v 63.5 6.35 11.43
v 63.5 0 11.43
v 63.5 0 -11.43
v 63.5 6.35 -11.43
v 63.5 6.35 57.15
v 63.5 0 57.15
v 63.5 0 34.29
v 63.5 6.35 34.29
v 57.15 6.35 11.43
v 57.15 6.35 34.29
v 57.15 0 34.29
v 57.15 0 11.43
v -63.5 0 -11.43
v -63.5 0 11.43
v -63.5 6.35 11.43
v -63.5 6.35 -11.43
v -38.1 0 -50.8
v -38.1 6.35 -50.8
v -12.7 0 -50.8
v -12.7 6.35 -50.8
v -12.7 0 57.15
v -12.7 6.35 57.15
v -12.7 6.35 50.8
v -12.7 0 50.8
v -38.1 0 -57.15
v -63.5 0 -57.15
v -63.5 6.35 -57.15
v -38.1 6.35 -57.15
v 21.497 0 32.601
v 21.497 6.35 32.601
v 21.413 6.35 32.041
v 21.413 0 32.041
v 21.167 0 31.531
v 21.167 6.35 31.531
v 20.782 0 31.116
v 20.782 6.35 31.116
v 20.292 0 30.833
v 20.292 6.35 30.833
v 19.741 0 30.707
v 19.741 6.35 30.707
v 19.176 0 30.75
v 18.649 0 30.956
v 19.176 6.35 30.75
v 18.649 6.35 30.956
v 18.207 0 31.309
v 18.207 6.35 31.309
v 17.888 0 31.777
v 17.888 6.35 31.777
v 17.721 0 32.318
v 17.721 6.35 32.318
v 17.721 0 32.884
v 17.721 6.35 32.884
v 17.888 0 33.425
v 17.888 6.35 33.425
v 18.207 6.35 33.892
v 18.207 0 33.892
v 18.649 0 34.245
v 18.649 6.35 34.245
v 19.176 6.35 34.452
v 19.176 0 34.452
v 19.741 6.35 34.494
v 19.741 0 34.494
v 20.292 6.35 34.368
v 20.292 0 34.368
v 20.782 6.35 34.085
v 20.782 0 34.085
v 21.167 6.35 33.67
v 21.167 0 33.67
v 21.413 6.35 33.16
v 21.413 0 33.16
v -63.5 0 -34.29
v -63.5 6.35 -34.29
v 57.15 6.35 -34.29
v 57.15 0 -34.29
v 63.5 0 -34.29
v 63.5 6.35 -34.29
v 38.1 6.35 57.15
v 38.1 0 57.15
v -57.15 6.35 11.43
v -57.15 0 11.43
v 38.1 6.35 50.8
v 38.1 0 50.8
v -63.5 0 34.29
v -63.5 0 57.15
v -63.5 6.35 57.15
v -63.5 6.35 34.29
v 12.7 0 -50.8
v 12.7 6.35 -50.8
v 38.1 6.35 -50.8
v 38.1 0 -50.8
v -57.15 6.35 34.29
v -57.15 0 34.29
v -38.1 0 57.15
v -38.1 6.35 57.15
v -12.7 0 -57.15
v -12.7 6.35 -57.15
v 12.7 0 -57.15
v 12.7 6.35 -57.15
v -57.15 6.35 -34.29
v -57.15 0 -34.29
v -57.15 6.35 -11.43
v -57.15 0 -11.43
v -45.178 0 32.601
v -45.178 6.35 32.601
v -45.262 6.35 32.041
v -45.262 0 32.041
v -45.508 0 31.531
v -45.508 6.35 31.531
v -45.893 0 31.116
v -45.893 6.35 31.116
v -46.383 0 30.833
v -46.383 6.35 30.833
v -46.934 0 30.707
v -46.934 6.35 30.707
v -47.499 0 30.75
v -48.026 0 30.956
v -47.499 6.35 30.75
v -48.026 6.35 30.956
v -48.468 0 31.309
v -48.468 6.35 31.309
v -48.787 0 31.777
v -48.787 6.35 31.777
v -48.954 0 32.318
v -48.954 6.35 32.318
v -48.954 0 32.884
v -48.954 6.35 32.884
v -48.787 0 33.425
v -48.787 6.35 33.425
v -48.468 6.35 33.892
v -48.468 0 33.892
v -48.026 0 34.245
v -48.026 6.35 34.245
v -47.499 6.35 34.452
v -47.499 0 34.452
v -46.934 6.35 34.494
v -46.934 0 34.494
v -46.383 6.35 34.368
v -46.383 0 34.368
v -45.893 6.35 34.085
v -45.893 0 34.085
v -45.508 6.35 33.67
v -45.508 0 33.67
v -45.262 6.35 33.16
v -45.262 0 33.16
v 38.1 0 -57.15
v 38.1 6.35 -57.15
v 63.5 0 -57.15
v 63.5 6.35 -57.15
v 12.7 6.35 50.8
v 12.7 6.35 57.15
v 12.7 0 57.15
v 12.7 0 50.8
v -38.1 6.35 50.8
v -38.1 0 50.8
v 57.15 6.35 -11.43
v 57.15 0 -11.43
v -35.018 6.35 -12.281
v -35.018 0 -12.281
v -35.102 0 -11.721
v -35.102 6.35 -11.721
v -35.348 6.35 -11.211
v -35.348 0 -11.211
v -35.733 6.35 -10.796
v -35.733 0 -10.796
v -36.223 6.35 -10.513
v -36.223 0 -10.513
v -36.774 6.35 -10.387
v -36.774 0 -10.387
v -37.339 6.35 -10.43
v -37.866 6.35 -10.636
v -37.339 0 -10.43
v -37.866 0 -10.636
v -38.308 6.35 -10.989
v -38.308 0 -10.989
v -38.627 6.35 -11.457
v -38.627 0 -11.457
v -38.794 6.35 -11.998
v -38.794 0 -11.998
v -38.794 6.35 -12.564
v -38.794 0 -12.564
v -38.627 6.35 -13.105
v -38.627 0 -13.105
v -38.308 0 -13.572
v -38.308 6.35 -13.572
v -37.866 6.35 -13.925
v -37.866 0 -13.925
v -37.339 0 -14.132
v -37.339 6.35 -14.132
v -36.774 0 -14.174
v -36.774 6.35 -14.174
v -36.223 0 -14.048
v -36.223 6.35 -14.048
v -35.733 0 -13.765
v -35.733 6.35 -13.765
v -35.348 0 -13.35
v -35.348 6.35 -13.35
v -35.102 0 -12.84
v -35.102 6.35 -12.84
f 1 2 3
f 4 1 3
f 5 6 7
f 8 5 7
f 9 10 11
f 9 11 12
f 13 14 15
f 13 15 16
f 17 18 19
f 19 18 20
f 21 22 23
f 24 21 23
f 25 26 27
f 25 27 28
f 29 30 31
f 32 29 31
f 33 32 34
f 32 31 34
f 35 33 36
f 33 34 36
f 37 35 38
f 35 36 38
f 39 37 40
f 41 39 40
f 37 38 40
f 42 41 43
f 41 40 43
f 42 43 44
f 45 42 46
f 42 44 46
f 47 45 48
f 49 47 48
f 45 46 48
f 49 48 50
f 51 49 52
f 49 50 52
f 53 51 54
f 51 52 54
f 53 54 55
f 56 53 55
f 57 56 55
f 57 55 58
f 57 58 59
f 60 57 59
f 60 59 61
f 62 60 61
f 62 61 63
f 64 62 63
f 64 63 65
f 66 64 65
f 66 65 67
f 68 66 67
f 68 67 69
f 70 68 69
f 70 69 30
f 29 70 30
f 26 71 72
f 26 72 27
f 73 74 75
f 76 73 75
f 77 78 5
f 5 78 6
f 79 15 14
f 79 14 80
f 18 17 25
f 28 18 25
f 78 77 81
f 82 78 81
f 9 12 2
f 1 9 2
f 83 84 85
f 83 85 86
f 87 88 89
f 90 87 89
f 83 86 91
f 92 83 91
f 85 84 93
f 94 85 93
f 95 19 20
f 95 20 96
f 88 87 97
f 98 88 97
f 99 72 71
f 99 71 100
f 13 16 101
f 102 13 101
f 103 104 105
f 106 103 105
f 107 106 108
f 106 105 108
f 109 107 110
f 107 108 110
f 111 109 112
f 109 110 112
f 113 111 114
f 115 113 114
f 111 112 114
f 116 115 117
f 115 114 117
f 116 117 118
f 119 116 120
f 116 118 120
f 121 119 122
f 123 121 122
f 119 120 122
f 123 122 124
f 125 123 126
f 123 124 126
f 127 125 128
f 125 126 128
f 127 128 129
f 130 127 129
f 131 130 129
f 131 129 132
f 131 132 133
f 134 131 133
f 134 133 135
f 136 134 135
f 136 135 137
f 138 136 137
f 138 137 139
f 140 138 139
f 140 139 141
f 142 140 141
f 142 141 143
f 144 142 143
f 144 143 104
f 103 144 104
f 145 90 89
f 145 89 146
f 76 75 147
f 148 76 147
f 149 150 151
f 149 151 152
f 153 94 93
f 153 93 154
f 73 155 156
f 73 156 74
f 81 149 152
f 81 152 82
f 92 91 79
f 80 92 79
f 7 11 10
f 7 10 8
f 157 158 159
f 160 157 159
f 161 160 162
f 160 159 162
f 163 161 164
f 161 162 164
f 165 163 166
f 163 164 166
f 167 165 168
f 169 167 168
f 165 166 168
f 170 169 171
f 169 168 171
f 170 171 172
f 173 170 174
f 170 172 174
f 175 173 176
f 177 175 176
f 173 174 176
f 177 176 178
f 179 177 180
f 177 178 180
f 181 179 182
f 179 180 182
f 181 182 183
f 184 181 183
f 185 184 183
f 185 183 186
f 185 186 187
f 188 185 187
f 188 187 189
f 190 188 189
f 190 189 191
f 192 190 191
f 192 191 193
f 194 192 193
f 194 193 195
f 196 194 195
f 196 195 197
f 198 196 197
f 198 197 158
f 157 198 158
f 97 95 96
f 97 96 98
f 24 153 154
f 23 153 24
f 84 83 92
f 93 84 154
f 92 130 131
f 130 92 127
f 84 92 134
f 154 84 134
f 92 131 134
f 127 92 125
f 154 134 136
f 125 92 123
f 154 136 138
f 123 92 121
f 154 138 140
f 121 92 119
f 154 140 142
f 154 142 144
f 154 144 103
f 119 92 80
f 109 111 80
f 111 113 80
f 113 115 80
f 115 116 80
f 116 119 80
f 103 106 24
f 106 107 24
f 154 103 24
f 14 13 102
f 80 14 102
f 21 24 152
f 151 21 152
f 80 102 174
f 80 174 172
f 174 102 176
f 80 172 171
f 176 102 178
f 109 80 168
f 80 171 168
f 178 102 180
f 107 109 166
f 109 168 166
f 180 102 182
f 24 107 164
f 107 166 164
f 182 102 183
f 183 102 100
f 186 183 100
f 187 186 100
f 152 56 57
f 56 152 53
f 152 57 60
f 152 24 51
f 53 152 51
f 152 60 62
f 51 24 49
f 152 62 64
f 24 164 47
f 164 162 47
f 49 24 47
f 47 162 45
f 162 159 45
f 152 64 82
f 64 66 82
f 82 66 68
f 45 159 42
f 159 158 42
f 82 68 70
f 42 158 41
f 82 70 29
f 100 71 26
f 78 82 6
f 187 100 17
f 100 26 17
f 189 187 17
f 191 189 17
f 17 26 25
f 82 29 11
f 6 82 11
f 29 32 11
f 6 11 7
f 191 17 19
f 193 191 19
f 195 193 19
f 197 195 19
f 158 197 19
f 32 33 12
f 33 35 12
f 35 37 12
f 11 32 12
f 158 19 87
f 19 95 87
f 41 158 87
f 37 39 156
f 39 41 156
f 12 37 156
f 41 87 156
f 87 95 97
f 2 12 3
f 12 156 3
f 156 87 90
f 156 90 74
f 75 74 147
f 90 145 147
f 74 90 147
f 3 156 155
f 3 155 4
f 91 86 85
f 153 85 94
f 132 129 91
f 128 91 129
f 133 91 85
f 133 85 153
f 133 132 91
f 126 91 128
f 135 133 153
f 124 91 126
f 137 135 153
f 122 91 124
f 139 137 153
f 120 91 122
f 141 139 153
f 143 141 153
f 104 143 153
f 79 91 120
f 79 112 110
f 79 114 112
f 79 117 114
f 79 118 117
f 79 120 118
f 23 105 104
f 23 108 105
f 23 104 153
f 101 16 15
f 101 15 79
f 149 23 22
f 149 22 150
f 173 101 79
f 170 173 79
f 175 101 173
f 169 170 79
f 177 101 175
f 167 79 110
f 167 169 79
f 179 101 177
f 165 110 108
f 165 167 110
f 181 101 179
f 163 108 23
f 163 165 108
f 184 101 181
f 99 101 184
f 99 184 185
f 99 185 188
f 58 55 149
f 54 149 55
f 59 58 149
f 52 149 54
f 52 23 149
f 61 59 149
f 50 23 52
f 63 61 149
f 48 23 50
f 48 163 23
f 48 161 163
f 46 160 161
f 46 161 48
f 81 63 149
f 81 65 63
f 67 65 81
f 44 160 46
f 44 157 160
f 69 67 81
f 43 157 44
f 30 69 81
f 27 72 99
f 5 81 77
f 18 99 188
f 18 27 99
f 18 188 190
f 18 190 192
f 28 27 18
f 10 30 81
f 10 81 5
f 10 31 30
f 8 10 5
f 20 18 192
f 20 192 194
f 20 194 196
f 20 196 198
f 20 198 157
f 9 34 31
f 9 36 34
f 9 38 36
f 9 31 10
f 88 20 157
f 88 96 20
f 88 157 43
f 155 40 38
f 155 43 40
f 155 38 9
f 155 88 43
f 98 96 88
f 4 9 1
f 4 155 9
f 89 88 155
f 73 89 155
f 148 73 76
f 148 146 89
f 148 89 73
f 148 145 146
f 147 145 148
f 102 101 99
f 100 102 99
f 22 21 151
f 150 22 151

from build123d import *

# Parameters (mm, degrees)
SKETCH1_W           = 127
SKETCH1_H           = 114.3
BOSS_EXTRUDE1_DEPTH = 6.35
SKETCH2_W           = 6.35
SKETCH2_H           = 22.86
SKETCH2_W_2         = 25.4
SKETCH2_H_2         = 6.35
CUT_EXTRUDE1_DEPTH  = 7.35
SKETCH3_R           = 1.89865
CUT_EXTRUDE2_DEPTH  = 7.35
SKETCH4_R           = 1.89865
CUT_EXTRUDE3_DEPTH  = 7.35


with BuildPart() as part:
    # Sketch1 → Boss-Extrude1 (new body)
    with BuildSketch(Plane(origin=(0, 0, 0), x_dir=(1, 0, 0), z_dir=(0, 1, 0))):
        Rectangle(SKETCH1_W, SKETCH1_H)
    extrude(amount=BOSS_EXTRUDE1_DEPTH)

    # Sketch2 → Cut-Extrude1 (cut, through all)
    with BuildSketch(Plane(origin=(0, 6.35, 0), x_dir=(1, 0, 0), z_dir=(0, 1, 0))):
        with Locations((-60.325, -22.86)):
            Rectangle(SKETCH2_W, SKETCH2_H)
        with Locations((-60.325, 22.86)):
            Rectangle(SKETCH2_W, SKETCH2_H)
        with Locations((-25.4, 53.975)):
            Rectangle(SKETCH2_W_2, SKETCH2_H_2)
        with Locations((25.4, 53.975)):
            Rectangle(SKETCH2_W_2, SKETCH2_H_2)
        with Locations((60.325, 22.86)):
            Rectangle(SKETCH2_W, SKETCH2_H)
        with Locations((60.325, -22.86)):
            Rectangle(SKETCH2_W, SKETCH2_H)
        with Locations((25.4, -53.975)):
            Rectangle(SKETCH2_W_2, SKETCH2_H_2)
        with Locations((-25.4, -53.975)):
            Rectangle(SKETCH2_W_2, SKETCH2_H_2)
    extrude(amount=-CUT_EXTRUDE1_DEPTH, mode=Mode.SUBTRACT)

    # Sketch3 → Cut-Extrude2 (cut, through all)
    with BuildSketch(Plane(origin=(0, 6.35, 0), x_dir=(1, 0, 0), z_dir=(0, 1, 0))):
        with Locations((-47.076322948, -32.600738686)):
            Circle(SKETCH3_R)
        with Locations((19.598677052, -32.600738686)):
            Circle(SKETCH3_R)
    extrude(amount=-CUT_EXTRUDE2_DEPTH, mode=Mode.SUBTRACT)

    # Sketch4 → Cut-Extrude3 (cut, through all)
    with BuildSketch(Plane.XZ):
        with Locations((-36.916322948, -12.280738686)):
            Circle(SKETCH4_R)
    extrude(amount=-CUT_EXTRUDE3_DEPTH, mode=Mode.SUBTRACT)


solid = part.part
